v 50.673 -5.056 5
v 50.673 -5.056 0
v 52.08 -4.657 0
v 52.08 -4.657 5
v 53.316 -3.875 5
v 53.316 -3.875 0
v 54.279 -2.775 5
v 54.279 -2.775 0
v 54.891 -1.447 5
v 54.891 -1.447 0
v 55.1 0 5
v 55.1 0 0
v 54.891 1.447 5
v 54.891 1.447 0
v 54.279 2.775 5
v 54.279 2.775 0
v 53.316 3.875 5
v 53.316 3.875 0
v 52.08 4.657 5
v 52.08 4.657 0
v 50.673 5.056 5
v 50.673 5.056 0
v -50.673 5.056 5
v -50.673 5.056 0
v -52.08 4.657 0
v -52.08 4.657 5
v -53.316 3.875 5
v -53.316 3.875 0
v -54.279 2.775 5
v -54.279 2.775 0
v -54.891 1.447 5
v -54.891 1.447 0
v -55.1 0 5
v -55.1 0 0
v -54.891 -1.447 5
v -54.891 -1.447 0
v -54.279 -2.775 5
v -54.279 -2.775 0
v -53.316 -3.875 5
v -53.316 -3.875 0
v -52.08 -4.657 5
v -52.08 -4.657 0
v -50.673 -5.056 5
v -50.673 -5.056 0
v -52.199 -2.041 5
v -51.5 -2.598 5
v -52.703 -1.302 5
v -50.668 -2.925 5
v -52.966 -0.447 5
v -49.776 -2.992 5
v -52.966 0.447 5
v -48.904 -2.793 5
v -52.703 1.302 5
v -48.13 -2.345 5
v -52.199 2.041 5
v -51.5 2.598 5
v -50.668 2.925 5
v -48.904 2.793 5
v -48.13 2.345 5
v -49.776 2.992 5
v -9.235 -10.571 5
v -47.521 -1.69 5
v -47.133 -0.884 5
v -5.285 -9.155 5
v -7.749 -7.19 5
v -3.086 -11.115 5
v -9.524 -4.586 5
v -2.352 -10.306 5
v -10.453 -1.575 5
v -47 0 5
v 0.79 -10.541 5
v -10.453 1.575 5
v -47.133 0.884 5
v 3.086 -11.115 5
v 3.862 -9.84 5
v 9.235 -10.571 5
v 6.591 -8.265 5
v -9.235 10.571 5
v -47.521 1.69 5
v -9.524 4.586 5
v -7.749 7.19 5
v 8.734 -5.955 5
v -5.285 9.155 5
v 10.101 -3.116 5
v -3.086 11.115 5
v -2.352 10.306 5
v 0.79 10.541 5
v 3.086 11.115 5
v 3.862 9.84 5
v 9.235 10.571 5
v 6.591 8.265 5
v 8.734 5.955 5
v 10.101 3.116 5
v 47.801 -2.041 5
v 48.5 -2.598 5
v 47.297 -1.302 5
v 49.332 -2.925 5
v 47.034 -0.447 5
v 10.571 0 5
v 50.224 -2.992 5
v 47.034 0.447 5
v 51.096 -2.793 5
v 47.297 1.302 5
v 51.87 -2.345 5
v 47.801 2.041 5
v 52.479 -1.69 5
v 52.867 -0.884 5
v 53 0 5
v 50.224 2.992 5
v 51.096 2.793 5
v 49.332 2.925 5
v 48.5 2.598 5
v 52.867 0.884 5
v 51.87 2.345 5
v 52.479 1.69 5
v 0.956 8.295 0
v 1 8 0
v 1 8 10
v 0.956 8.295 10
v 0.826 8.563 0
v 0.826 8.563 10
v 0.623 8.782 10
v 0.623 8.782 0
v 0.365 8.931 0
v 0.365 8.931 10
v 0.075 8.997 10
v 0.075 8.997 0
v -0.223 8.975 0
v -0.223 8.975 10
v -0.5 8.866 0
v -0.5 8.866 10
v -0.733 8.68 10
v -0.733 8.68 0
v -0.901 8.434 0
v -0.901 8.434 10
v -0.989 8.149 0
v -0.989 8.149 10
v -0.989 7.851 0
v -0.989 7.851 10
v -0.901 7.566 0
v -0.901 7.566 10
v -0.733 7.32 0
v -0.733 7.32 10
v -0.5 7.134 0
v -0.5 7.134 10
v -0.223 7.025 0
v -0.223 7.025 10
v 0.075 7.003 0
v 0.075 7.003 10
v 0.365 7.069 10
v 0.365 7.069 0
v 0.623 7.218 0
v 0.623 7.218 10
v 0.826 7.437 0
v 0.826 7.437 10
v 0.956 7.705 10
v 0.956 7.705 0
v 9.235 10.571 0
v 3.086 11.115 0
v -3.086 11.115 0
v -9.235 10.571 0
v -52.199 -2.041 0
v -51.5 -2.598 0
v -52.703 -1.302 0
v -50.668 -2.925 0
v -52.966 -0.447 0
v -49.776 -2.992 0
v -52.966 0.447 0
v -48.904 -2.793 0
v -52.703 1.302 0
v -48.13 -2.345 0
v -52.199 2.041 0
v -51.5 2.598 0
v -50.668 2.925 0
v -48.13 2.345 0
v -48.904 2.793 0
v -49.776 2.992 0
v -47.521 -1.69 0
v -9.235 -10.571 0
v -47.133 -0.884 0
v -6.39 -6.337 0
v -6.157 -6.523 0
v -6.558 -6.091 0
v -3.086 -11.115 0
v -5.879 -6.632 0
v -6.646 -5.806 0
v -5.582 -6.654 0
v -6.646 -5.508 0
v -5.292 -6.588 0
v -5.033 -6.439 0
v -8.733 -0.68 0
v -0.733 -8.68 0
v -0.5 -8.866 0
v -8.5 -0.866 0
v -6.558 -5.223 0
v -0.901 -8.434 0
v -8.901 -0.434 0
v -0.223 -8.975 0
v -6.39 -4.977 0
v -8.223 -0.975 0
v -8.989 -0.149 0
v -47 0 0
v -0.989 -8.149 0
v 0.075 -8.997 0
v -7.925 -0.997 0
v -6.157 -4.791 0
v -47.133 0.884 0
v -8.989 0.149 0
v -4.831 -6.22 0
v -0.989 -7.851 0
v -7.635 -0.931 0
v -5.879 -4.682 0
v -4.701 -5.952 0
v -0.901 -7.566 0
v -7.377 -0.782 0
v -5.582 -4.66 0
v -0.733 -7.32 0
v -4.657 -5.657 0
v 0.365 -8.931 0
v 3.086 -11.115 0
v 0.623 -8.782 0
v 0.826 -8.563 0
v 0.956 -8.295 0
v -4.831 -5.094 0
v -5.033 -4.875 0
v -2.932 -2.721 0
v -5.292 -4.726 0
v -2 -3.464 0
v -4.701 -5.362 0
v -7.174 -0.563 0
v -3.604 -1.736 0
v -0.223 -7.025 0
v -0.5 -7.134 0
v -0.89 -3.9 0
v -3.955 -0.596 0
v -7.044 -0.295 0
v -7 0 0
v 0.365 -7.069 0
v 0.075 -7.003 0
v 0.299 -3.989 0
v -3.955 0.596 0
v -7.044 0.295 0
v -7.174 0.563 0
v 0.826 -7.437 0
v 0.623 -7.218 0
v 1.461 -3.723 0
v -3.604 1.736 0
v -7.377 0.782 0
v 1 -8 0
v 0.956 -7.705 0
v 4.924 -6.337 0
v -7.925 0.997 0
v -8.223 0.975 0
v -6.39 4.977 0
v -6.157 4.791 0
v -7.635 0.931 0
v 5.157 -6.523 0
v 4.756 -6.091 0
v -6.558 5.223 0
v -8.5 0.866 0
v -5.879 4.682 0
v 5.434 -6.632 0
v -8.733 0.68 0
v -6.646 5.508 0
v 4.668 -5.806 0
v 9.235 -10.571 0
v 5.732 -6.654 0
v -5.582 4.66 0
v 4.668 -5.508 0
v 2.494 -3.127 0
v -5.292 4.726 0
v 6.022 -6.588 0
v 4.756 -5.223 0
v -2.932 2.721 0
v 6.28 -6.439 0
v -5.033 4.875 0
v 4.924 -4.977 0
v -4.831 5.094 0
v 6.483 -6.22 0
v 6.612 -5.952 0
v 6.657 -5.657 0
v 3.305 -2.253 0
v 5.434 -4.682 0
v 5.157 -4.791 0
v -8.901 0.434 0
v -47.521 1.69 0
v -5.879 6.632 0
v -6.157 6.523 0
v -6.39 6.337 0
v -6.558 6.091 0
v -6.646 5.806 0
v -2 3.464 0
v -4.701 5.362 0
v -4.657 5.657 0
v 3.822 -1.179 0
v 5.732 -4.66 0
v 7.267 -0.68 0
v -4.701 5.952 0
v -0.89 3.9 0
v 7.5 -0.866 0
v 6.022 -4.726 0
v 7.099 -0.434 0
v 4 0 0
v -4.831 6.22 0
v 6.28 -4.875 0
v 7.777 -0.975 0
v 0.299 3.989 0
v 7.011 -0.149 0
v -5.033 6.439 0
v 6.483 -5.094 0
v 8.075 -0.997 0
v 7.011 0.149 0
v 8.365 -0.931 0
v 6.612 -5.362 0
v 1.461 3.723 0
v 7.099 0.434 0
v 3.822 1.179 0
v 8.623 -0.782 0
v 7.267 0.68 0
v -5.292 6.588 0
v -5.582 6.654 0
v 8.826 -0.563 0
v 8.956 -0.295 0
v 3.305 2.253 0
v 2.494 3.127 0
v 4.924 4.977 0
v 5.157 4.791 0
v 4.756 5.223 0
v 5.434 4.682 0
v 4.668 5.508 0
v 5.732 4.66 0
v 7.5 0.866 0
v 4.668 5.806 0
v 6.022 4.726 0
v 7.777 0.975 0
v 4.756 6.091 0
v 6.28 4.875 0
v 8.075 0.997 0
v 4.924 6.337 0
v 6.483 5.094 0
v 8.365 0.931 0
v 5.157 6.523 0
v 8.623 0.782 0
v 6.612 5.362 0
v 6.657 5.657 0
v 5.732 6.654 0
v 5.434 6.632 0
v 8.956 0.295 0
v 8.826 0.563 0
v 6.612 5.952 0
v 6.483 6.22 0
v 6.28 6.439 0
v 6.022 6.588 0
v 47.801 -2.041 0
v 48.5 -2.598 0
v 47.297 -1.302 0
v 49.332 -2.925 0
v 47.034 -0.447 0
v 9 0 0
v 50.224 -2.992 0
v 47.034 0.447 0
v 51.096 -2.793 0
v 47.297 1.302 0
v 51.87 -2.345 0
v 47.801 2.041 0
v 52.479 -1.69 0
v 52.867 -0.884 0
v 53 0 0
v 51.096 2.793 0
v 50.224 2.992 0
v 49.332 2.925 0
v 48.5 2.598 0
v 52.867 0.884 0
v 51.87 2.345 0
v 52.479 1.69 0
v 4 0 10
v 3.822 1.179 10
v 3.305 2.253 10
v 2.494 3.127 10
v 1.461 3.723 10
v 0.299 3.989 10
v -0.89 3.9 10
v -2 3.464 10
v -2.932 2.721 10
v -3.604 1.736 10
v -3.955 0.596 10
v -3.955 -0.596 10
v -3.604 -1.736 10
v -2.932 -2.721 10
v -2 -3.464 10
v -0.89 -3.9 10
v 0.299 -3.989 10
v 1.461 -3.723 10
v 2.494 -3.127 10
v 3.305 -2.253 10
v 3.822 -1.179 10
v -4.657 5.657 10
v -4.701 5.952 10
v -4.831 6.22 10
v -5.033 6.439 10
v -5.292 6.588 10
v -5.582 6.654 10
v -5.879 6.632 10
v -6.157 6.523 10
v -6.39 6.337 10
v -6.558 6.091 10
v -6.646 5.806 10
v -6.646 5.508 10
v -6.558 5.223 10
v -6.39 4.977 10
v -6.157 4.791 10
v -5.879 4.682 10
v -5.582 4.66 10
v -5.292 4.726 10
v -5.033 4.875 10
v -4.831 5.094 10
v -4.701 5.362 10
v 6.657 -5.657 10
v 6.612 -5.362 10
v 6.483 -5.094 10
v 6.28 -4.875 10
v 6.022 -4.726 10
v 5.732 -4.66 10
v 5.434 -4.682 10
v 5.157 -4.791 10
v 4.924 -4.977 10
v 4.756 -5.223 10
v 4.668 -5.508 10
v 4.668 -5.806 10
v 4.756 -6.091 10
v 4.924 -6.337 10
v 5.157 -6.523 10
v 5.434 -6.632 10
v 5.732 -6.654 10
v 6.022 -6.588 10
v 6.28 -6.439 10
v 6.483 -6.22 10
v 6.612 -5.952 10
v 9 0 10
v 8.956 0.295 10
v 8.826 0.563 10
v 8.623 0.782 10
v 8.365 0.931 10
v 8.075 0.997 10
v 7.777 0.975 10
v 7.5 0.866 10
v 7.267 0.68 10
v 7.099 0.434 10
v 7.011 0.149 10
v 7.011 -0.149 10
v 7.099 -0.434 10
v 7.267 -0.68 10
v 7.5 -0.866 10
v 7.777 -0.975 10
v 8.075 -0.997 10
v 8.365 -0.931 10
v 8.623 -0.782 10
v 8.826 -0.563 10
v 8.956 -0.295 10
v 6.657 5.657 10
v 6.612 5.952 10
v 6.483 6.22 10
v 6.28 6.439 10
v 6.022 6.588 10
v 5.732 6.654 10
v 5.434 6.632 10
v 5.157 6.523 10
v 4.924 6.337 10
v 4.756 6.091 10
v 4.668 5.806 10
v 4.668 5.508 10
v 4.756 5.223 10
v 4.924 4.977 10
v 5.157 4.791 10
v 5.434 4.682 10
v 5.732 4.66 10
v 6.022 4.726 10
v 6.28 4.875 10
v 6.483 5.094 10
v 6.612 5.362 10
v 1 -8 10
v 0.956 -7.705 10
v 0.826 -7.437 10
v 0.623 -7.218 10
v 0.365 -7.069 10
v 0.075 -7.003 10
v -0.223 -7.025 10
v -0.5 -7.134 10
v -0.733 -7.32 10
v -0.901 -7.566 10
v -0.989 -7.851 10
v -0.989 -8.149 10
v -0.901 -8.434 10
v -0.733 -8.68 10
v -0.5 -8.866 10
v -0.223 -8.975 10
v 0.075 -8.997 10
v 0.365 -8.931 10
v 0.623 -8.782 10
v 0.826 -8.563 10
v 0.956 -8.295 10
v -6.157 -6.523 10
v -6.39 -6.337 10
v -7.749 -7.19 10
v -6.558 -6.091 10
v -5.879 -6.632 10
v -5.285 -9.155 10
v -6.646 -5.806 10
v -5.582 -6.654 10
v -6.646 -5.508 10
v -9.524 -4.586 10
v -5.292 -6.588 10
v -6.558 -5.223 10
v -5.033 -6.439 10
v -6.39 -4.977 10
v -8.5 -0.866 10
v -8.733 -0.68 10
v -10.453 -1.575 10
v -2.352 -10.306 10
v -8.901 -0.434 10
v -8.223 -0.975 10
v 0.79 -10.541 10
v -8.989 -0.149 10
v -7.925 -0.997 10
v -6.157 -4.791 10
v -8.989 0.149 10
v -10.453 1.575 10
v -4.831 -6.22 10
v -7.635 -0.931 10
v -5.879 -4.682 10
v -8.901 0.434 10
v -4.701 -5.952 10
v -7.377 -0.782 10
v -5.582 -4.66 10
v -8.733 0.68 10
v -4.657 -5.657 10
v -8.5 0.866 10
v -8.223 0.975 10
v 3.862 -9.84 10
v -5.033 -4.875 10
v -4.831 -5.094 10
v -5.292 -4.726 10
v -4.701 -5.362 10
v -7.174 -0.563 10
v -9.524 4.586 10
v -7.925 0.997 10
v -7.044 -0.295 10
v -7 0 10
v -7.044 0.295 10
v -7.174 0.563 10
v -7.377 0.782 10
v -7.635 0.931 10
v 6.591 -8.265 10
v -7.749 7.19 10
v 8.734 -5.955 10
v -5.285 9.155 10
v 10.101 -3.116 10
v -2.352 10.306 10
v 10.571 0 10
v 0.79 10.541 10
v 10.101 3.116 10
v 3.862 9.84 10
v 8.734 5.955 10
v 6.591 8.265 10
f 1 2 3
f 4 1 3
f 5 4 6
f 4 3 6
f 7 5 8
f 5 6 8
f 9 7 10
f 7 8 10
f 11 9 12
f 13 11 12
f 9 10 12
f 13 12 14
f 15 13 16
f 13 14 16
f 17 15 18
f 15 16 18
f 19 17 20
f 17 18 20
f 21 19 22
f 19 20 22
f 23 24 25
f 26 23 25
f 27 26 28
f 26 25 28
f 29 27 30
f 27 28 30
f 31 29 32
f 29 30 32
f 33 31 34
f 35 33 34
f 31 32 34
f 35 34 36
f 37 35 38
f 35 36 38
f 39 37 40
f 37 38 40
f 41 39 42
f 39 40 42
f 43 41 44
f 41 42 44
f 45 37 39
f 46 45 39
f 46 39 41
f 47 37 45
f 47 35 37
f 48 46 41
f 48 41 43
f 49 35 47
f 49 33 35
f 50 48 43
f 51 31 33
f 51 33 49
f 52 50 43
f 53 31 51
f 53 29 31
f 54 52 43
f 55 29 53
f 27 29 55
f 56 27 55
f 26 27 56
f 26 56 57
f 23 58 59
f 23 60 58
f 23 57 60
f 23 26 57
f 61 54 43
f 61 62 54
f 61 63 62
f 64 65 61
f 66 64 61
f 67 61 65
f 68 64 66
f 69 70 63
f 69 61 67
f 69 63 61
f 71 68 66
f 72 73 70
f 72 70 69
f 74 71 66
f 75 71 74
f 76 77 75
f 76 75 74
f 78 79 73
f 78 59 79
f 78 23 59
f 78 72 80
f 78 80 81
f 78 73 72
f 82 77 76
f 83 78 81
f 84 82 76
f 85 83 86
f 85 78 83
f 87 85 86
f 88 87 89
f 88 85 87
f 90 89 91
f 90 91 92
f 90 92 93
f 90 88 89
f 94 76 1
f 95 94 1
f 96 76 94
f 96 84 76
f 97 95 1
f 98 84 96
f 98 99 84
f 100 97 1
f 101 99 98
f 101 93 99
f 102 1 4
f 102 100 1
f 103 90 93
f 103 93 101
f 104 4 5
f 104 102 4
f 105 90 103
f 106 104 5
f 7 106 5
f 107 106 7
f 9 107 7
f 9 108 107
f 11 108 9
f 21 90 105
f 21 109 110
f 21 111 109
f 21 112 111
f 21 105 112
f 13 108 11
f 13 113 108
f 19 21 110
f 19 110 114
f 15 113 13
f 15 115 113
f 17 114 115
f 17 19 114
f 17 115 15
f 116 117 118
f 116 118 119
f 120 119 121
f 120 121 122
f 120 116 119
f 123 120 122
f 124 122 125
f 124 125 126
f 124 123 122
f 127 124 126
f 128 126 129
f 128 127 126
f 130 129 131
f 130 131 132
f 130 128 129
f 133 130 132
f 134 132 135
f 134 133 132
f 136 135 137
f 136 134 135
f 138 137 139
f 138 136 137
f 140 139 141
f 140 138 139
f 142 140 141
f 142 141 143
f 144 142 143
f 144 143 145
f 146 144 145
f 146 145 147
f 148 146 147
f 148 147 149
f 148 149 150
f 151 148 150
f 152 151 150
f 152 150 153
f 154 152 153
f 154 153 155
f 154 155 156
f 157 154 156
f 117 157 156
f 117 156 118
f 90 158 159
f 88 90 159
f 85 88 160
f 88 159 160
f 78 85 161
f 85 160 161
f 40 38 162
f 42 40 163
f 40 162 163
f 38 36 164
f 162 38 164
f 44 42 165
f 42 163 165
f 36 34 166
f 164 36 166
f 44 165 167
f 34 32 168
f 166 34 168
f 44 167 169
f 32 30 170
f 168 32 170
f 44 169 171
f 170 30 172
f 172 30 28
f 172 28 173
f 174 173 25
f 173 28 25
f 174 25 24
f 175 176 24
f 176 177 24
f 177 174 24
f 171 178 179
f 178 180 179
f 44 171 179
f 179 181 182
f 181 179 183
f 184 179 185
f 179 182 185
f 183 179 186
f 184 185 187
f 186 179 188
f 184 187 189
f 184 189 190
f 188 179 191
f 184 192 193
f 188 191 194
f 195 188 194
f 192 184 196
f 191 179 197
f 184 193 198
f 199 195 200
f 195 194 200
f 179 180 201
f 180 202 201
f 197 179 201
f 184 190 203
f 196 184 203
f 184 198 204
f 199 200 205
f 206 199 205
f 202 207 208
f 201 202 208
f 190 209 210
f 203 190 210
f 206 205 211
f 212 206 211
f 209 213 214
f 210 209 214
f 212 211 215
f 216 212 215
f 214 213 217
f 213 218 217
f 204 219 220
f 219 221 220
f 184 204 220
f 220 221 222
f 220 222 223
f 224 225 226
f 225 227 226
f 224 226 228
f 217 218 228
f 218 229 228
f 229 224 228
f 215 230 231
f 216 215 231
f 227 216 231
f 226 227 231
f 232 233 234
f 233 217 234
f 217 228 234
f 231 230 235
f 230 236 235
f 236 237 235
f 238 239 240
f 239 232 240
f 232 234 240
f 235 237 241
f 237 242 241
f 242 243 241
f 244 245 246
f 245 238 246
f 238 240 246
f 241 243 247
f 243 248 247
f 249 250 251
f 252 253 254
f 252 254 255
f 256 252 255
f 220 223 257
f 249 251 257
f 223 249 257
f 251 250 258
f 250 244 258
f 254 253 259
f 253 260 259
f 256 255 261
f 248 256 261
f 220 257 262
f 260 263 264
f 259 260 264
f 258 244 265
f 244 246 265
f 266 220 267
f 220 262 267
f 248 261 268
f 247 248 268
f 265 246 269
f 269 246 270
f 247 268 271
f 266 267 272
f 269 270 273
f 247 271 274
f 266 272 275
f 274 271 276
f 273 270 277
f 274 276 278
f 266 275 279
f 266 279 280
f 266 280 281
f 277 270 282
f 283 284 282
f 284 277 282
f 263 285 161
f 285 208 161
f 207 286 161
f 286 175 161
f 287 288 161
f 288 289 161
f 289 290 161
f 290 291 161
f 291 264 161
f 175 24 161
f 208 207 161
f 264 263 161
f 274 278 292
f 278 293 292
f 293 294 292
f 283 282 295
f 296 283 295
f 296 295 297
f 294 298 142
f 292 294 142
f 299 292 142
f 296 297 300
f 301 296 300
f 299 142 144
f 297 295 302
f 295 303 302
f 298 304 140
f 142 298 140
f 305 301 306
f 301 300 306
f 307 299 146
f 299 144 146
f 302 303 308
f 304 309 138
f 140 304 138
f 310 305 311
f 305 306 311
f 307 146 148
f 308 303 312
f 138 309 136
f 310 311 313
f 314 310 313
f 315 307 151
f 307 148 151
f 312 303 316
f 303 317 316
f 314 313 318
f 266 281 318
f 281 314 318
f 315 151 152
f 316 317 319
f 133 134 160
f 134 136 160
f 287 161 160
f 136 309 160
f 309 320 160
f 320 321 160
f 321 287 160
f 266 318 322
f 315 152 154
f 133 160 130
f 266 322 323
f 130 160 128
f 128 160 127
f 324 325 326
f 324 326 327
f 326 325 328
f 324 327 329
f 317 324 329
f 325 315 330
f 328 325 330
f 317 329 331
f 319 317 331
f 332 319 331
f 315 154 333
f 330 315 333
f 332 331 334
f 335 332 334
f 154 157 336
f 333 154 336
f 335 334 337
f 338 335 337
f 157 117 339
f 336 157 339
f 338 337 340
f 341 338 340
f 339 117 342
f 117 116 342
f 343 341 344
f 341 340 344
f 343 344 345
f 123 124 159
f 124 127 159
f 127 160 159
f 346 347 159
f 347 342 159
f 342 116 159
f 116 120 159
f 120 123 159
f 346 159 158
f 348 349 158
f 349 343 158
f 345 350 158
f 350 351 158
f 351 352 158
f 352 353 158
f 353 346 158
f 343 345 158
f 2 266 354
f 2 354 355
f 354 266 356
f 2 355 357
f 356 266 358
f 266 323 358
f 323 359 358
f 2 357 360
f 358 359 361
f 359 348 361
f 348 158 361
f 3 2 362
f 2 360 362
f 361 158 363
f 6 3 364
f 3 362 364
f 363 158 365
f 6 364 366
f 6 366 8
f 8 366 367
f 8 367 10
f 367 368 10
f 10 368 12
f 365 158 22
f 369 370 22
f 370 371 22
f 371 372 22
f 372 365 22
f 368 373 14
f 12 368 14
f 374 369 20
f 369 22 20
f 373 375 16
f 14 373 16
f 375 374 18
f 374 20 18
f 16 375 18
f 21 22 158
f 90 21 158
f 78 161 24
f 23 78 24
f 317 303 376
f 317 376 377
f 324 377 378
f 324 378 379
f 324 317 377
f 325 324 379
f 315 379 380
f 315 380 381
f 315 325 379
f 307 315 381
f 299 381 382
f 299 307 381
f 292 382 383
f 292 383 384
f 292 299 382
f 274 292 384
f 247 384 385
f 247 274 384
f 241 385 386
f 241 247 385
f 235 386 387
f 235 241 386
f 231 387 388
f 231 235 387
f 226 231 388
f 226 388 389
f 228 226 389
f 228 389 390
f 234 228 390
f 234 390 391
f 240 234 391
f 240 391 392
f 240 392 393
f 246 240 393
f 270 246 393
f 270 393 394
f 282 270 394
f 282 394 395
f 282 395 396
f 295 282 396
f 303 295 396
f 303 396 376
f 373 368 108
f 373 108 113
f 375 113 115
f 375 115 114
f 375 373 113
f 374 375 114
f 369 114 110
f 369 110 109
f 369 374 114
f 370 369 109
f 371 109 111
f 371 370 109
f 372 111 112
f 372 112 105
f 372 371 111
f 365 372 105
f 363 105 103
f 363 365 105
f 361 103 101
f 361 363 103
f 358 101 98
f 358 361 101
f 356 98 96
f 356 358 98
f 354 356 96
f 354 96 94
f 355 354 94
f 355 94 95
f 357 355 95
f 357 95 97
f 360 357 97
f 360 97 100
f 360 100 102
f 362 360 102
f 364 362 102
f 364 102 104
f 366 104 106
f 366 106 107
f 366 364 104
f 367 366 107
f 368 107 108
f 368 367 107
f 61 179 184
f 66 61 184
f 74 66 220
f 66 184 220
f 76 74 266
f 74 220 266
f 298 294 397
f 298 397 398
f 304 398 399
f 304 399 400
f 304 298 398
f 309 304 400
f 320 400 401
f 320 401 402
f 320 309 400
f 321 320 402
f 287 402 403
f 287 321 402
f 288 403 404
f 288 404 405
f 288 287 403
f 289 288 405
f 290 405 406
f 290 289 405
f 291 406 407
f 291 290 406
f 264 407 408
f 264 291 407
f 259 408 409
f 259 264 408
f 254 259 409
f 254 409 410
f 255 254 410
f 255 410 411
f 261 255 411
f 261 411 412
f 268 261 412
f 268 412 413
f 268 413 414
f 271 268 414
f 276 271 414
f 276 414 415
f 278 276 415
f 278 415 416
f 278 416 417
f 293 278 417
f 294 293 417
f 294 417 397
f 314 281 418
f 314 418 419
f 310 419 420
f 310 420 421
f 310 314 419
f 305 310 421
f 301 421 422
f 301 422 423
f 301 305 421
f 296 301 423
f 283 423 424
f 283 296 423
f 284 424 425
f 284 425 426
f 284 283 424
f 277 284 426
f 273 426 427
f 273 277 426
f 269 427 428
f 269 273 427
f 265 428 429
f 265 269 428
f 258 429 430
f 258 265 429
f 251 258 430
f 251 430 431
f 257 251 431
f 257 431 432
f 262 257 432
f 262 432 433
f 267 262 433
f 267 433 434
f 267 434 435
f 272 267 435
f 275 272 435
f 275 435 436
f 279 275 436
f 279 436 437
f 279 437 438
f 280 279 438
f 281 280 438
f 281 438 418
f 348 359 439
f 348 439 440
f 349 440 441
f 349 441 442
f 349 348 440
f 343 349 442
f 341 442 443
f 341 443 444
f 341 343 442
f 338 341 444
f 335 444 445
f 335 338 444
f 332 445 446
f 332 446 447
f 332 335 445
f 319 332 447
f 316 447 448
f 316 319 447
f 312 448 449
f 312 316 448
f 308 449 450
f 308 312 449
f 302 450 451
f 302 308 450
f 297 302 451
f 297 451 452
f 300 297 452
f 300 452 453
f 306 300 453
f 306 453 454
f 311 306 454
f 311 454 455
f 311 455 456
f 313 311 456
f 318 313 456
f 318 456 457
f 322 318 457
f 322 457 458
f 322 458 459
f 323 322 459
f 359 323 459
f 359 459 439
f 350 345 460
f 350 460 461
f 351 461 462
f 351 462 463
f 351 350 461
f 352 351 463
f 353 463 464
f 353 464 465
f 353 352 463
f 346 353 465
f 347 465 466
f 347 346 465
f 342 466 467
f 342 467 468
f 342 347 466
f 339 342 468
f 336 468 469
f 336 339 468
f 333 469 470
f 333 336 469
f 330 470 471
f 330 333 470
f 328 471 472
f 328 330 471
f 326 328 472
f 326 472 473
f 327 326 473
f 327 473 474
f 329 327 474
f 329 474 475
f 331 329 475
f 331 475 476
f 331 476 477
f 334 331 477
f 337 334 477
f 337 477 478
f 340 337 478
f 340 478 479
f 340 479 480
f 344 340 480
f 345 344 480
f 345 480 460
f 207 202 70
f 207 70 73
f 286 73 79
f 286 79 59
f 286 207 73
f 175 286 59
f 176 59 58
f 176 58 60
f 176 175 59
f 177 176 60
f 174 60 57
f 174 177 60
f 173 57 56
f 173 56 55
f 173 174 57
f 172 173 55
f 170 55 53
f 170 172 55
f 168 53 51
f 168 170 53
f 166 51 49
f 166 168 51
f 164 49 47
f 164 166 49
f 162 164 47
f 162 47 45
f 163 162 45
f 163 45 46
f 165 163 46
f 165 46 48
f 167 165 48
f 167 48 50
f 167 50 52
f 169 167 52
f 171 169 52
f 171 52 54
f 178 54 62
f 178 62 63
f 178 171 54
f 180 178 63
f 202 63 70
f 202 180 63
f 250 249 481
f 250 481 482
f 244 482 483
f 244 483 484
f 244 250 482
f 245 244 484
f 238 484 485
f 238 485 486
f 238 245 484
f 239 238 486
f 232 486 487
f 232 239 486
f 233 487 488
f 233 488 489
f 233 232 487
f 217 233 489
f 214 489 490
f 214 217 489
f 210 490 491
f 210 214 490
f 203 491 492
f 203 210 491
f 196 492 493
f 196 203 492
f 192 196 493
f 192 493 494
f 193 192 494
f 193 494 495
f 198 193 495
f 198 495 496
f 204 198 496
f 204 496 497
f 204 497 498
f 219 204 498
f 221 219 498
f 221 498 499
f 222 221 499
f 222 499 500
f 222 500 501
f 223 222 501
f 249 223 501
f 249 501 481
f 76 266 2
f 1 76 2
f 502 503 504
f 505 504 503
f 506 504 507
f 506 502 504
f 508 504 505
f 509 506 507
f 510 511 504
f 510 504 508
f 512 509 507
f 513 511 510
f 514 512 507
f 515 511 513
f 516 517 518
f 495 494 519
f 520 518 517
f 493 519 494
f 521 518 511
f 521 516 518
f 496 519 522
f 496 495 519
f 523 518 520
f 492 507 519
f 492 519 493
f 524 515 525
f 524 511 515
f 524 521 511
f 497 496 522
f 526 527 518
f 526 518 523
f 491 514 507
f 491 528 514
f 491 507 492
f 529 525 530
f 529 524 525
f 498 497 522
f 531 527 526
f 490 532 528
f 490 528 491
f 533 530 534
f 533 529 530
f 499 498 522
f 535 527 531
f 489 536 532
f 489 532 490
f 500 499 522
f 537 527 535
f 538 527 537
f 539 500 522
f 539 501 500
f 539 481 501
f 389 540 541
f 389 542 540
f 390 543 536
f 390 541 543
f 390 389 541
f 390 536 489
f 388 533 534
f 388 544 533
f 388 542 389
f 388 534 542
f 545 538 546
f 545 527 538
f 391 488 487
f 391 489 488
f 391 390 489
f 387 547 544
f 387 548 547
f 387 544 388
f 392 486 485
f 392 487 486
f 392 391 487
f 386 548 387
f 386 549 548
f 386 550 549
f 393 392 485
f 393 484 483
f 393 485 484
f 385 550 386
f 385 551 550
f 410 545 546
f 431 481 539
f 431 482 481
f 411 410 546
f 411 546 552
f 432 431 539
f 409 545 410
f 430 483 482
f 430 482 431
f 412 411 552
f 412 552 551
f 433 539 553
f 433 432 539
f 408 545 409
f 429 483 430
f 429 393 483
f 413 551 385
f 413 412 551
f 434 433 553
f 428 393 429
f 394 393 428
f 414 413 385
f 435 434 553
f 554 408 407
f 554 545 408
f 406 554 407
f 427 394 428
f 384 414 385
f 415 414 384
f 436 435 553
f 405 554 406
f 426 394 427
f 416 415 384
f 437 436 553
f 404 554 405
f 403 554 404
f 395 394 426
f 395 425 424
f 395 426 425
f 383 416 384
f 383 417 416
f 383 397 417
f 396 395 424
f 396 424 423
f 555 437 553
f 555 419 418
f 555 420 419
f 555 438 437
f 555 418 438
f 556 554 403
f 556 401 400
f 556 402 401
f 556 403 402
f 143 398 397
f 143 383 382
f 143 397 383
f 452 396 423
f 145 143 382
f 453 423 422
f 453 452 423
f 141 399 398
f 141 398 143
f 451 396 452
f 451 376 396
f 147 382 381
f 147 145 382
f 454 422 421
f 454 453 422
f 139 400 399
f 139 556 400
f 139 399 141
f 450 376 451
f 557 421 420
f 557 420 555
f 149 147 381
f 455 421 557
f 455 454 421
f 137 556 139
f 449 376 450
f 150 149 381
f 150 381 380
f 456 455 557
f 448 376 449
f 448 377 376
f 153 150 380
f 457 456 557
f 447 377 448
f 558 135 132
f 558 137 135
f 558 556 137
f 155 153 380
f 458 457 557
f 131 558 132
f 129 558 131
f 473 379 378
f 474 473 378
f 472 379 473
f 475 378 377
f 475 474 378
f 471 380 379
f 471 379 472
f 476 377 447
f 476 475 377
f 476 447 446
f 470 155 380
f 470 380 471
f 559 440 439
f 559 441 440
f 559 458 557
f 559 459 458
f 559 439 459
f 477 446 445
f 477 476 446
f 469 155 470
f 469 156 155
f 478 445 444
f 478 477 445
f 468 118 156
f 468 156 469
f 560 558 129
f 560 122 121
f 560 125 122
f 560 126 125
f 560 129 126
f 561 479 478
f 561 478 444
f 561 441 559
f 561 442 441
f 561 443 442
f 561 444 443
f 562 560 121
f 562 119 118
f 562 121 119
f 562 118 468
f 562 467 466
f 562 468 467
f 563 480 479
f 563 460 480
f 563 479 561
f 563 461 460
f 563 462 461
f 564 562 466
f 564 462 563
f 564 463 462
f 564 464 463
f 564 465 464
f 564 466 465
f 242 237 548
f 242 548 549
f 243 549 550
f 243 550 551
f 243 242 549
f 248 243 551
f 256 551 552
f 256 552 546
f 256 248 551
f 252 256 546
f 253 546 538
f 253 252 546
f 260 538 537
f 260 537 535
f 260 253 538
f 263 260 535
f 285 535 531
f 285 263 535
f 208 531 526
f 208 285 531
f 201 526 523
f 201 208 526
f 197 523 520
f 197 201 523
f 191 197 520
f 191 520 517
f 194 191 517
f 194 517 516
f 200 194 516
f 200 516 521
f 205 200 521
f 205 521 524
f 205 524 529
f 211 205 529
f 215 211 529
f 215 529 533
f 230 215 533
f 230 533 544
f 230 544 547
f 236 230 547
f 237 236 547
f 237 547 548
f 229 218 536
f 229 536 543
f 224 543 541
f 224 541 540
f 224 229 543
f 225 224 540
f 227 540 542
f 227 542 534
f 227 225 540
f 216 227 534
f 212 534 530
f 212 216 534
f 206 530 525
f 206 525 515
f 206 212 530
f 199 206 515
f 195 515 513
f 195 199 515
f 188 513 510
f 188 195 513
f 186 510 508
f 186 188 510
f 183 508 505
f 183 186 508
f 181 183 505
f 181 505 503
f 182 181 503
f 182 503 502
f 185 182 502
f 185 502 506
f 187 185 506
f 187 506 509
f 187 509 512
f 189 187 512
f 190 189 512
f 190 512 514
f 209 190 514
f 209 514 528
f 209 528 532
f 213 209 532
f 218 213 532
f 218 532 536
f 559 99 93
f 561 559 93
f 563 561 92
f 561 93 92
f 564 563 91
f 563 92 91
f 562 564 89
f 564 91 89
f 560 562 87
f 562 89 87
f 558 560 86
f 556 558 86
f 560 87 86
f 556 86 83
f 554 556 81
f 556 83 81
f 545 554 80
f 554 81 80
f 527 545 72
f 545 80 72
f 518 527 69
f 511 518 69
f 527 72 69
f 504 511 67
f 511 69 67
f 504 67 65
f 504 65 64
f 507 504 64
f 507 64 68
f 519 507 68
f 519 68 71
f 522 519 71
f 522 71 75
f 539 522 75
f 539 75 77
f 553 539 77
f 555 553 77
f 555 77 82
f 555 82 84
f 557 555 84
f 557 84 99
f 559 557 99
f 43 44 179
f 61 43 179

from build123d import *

# Parameters (mm, degrees)
SZKIC1_R                    = 3
SZKIC1_R_2                  = 1
SZKIC1_R_3                  = 4
DODANIE_WYCI_GNI_CIE1_DEPTH = 5
SZKIC1_3_R                  = 10.570763761
SZKIC1_3_R_2                = 1
SZKIC1_3_R_3                = 4
DODANIE_WYCI_GNI_CIE2_DEPTH = 10


with BuildPart() as part:
    # Szkic1 → Dodanie-wyci_gni_cie1 (new body)
    with BuildSketch(Plane.XY):
        with BuildLine():
            Line((-9.235111676, 10.570763761), (-50.67287635, 5.055665151))
            ThreePointArc((-50.67287635, 5.055665151), (-55.100246338, 0), (-50.67287635, -5.055665151))
            Line((-50.67287635, -5.055665151), (-9.235111676, -10.570763761))
            ThreePointArc((-9.235111676, -10.570763761), (0, -11.182632843), (9.235111676, -10.570763761))
            Line((9.235111676, -10.570763761), (50.67287635, -5.055665151))
            ThreePointArc((50.67287635, -5.055665151), (55.100246338, 0), (50.67287635, 5.055665151))
            Line((50.67287635, 5.055665151), (9.235111676, 10.570763761))
            ThreePointArc((9.235111676, 10.570763761), (0, 11.182632843), (-9.235111676, 10.570763761))
        make_face()
        with Locations((-50, 0)):
            Circle(SZKIC1_R, mode=Mode.SUBTRACT)
        with Locations((50, 0)):
            Circle(SZKIC1_R, mode=Mode.SUBTRACT)
        with Locations((0, 8)):
            Circle(SZKIC1_R_2, mode=Mode.SUBTRACT)
        with Locations((0, -8)):
            Circle(SZKIC1_R_2, mode=Mode.SUBTRACT)
        with Locations((-5.656854249, -5.656854249)):
            Circle(SZKIC1_R_2, mode=Mode.SUBTRACT)
        with Locations((-8, 0)):
            Circle(SZKIC1_R_2, mode=Mode.SUBTRACT)
        Circle(SZKIC1_R_3, mode=Mode.SUBTRACT)
        with Locations((5.656854249, -5.656854249)):
            Circle(SZKIC1_R_2, mode=Mode.SUBTRACT)
        with Locations((8, 0)):
            Circle(SZKIC1_R_2, mode=Mode.SUBTRACT)
        with Locations((-5.656854249, 5.656854249)):
            Circle(SZKIC1_R_2, mode=Mode.SUBTRACT)
        with Locations((5.656854249, 5.656854249)):
            Circle(SZKIC1_R_2, mode=Mode.SUBTRACT)
    extrude(amount=DODANIE_WYCI_GNI_CIE1_DEPTH)

    # Szkic1_3 → Dodanie-wyci_gni_cie2 (add)
    with BuildSketch(Plane.XY):
        Circle(SZKIC1_3_R)
        with Locations((0, -8)):
            Circle(SZKIC1_3_R_2, mode=Mode.SUBTRACT)
        with Locations((-5.656854249, -5.656854249)):
            Circle(SZKIC1_3_R_2, mode=Mode.SUBTRACT)
        with Locations((-8, 0)):
            Circle(SZKIC1_3_R_2, mode=Mode.SUBTRACT)
        Circle(SZKIC1_3_R_3, mode=Mode.SUBTRACT)
        with Locations((5.656854249, -5.656854249)):
            Circle(SZKIC1_3_R_2, mode=Mode.SUBTRACT)
        with Locations((8, 0)):
            Circle(SZKIC1_3_R_2, mode=Mode.SUBTRACT)
        with Locations((-5.656854249, 5.656854249)):
            Circle(SZKIC1_3_R_2, mode=Mode.SUBTRACT)
        with Locations((5.656854249, 5.656854249)):
            Circle(SZKIC1_3_R_2, mode=Mode.SUBTRACT)
        with Locations((0, 8)):
            Circle(SZKIC1_3_R_2, mode=Mode.SUBTRACT)
    extrude(amount=DODANIE_WYCI_GNI_CIE2_DEPTH)


solid = part.part
